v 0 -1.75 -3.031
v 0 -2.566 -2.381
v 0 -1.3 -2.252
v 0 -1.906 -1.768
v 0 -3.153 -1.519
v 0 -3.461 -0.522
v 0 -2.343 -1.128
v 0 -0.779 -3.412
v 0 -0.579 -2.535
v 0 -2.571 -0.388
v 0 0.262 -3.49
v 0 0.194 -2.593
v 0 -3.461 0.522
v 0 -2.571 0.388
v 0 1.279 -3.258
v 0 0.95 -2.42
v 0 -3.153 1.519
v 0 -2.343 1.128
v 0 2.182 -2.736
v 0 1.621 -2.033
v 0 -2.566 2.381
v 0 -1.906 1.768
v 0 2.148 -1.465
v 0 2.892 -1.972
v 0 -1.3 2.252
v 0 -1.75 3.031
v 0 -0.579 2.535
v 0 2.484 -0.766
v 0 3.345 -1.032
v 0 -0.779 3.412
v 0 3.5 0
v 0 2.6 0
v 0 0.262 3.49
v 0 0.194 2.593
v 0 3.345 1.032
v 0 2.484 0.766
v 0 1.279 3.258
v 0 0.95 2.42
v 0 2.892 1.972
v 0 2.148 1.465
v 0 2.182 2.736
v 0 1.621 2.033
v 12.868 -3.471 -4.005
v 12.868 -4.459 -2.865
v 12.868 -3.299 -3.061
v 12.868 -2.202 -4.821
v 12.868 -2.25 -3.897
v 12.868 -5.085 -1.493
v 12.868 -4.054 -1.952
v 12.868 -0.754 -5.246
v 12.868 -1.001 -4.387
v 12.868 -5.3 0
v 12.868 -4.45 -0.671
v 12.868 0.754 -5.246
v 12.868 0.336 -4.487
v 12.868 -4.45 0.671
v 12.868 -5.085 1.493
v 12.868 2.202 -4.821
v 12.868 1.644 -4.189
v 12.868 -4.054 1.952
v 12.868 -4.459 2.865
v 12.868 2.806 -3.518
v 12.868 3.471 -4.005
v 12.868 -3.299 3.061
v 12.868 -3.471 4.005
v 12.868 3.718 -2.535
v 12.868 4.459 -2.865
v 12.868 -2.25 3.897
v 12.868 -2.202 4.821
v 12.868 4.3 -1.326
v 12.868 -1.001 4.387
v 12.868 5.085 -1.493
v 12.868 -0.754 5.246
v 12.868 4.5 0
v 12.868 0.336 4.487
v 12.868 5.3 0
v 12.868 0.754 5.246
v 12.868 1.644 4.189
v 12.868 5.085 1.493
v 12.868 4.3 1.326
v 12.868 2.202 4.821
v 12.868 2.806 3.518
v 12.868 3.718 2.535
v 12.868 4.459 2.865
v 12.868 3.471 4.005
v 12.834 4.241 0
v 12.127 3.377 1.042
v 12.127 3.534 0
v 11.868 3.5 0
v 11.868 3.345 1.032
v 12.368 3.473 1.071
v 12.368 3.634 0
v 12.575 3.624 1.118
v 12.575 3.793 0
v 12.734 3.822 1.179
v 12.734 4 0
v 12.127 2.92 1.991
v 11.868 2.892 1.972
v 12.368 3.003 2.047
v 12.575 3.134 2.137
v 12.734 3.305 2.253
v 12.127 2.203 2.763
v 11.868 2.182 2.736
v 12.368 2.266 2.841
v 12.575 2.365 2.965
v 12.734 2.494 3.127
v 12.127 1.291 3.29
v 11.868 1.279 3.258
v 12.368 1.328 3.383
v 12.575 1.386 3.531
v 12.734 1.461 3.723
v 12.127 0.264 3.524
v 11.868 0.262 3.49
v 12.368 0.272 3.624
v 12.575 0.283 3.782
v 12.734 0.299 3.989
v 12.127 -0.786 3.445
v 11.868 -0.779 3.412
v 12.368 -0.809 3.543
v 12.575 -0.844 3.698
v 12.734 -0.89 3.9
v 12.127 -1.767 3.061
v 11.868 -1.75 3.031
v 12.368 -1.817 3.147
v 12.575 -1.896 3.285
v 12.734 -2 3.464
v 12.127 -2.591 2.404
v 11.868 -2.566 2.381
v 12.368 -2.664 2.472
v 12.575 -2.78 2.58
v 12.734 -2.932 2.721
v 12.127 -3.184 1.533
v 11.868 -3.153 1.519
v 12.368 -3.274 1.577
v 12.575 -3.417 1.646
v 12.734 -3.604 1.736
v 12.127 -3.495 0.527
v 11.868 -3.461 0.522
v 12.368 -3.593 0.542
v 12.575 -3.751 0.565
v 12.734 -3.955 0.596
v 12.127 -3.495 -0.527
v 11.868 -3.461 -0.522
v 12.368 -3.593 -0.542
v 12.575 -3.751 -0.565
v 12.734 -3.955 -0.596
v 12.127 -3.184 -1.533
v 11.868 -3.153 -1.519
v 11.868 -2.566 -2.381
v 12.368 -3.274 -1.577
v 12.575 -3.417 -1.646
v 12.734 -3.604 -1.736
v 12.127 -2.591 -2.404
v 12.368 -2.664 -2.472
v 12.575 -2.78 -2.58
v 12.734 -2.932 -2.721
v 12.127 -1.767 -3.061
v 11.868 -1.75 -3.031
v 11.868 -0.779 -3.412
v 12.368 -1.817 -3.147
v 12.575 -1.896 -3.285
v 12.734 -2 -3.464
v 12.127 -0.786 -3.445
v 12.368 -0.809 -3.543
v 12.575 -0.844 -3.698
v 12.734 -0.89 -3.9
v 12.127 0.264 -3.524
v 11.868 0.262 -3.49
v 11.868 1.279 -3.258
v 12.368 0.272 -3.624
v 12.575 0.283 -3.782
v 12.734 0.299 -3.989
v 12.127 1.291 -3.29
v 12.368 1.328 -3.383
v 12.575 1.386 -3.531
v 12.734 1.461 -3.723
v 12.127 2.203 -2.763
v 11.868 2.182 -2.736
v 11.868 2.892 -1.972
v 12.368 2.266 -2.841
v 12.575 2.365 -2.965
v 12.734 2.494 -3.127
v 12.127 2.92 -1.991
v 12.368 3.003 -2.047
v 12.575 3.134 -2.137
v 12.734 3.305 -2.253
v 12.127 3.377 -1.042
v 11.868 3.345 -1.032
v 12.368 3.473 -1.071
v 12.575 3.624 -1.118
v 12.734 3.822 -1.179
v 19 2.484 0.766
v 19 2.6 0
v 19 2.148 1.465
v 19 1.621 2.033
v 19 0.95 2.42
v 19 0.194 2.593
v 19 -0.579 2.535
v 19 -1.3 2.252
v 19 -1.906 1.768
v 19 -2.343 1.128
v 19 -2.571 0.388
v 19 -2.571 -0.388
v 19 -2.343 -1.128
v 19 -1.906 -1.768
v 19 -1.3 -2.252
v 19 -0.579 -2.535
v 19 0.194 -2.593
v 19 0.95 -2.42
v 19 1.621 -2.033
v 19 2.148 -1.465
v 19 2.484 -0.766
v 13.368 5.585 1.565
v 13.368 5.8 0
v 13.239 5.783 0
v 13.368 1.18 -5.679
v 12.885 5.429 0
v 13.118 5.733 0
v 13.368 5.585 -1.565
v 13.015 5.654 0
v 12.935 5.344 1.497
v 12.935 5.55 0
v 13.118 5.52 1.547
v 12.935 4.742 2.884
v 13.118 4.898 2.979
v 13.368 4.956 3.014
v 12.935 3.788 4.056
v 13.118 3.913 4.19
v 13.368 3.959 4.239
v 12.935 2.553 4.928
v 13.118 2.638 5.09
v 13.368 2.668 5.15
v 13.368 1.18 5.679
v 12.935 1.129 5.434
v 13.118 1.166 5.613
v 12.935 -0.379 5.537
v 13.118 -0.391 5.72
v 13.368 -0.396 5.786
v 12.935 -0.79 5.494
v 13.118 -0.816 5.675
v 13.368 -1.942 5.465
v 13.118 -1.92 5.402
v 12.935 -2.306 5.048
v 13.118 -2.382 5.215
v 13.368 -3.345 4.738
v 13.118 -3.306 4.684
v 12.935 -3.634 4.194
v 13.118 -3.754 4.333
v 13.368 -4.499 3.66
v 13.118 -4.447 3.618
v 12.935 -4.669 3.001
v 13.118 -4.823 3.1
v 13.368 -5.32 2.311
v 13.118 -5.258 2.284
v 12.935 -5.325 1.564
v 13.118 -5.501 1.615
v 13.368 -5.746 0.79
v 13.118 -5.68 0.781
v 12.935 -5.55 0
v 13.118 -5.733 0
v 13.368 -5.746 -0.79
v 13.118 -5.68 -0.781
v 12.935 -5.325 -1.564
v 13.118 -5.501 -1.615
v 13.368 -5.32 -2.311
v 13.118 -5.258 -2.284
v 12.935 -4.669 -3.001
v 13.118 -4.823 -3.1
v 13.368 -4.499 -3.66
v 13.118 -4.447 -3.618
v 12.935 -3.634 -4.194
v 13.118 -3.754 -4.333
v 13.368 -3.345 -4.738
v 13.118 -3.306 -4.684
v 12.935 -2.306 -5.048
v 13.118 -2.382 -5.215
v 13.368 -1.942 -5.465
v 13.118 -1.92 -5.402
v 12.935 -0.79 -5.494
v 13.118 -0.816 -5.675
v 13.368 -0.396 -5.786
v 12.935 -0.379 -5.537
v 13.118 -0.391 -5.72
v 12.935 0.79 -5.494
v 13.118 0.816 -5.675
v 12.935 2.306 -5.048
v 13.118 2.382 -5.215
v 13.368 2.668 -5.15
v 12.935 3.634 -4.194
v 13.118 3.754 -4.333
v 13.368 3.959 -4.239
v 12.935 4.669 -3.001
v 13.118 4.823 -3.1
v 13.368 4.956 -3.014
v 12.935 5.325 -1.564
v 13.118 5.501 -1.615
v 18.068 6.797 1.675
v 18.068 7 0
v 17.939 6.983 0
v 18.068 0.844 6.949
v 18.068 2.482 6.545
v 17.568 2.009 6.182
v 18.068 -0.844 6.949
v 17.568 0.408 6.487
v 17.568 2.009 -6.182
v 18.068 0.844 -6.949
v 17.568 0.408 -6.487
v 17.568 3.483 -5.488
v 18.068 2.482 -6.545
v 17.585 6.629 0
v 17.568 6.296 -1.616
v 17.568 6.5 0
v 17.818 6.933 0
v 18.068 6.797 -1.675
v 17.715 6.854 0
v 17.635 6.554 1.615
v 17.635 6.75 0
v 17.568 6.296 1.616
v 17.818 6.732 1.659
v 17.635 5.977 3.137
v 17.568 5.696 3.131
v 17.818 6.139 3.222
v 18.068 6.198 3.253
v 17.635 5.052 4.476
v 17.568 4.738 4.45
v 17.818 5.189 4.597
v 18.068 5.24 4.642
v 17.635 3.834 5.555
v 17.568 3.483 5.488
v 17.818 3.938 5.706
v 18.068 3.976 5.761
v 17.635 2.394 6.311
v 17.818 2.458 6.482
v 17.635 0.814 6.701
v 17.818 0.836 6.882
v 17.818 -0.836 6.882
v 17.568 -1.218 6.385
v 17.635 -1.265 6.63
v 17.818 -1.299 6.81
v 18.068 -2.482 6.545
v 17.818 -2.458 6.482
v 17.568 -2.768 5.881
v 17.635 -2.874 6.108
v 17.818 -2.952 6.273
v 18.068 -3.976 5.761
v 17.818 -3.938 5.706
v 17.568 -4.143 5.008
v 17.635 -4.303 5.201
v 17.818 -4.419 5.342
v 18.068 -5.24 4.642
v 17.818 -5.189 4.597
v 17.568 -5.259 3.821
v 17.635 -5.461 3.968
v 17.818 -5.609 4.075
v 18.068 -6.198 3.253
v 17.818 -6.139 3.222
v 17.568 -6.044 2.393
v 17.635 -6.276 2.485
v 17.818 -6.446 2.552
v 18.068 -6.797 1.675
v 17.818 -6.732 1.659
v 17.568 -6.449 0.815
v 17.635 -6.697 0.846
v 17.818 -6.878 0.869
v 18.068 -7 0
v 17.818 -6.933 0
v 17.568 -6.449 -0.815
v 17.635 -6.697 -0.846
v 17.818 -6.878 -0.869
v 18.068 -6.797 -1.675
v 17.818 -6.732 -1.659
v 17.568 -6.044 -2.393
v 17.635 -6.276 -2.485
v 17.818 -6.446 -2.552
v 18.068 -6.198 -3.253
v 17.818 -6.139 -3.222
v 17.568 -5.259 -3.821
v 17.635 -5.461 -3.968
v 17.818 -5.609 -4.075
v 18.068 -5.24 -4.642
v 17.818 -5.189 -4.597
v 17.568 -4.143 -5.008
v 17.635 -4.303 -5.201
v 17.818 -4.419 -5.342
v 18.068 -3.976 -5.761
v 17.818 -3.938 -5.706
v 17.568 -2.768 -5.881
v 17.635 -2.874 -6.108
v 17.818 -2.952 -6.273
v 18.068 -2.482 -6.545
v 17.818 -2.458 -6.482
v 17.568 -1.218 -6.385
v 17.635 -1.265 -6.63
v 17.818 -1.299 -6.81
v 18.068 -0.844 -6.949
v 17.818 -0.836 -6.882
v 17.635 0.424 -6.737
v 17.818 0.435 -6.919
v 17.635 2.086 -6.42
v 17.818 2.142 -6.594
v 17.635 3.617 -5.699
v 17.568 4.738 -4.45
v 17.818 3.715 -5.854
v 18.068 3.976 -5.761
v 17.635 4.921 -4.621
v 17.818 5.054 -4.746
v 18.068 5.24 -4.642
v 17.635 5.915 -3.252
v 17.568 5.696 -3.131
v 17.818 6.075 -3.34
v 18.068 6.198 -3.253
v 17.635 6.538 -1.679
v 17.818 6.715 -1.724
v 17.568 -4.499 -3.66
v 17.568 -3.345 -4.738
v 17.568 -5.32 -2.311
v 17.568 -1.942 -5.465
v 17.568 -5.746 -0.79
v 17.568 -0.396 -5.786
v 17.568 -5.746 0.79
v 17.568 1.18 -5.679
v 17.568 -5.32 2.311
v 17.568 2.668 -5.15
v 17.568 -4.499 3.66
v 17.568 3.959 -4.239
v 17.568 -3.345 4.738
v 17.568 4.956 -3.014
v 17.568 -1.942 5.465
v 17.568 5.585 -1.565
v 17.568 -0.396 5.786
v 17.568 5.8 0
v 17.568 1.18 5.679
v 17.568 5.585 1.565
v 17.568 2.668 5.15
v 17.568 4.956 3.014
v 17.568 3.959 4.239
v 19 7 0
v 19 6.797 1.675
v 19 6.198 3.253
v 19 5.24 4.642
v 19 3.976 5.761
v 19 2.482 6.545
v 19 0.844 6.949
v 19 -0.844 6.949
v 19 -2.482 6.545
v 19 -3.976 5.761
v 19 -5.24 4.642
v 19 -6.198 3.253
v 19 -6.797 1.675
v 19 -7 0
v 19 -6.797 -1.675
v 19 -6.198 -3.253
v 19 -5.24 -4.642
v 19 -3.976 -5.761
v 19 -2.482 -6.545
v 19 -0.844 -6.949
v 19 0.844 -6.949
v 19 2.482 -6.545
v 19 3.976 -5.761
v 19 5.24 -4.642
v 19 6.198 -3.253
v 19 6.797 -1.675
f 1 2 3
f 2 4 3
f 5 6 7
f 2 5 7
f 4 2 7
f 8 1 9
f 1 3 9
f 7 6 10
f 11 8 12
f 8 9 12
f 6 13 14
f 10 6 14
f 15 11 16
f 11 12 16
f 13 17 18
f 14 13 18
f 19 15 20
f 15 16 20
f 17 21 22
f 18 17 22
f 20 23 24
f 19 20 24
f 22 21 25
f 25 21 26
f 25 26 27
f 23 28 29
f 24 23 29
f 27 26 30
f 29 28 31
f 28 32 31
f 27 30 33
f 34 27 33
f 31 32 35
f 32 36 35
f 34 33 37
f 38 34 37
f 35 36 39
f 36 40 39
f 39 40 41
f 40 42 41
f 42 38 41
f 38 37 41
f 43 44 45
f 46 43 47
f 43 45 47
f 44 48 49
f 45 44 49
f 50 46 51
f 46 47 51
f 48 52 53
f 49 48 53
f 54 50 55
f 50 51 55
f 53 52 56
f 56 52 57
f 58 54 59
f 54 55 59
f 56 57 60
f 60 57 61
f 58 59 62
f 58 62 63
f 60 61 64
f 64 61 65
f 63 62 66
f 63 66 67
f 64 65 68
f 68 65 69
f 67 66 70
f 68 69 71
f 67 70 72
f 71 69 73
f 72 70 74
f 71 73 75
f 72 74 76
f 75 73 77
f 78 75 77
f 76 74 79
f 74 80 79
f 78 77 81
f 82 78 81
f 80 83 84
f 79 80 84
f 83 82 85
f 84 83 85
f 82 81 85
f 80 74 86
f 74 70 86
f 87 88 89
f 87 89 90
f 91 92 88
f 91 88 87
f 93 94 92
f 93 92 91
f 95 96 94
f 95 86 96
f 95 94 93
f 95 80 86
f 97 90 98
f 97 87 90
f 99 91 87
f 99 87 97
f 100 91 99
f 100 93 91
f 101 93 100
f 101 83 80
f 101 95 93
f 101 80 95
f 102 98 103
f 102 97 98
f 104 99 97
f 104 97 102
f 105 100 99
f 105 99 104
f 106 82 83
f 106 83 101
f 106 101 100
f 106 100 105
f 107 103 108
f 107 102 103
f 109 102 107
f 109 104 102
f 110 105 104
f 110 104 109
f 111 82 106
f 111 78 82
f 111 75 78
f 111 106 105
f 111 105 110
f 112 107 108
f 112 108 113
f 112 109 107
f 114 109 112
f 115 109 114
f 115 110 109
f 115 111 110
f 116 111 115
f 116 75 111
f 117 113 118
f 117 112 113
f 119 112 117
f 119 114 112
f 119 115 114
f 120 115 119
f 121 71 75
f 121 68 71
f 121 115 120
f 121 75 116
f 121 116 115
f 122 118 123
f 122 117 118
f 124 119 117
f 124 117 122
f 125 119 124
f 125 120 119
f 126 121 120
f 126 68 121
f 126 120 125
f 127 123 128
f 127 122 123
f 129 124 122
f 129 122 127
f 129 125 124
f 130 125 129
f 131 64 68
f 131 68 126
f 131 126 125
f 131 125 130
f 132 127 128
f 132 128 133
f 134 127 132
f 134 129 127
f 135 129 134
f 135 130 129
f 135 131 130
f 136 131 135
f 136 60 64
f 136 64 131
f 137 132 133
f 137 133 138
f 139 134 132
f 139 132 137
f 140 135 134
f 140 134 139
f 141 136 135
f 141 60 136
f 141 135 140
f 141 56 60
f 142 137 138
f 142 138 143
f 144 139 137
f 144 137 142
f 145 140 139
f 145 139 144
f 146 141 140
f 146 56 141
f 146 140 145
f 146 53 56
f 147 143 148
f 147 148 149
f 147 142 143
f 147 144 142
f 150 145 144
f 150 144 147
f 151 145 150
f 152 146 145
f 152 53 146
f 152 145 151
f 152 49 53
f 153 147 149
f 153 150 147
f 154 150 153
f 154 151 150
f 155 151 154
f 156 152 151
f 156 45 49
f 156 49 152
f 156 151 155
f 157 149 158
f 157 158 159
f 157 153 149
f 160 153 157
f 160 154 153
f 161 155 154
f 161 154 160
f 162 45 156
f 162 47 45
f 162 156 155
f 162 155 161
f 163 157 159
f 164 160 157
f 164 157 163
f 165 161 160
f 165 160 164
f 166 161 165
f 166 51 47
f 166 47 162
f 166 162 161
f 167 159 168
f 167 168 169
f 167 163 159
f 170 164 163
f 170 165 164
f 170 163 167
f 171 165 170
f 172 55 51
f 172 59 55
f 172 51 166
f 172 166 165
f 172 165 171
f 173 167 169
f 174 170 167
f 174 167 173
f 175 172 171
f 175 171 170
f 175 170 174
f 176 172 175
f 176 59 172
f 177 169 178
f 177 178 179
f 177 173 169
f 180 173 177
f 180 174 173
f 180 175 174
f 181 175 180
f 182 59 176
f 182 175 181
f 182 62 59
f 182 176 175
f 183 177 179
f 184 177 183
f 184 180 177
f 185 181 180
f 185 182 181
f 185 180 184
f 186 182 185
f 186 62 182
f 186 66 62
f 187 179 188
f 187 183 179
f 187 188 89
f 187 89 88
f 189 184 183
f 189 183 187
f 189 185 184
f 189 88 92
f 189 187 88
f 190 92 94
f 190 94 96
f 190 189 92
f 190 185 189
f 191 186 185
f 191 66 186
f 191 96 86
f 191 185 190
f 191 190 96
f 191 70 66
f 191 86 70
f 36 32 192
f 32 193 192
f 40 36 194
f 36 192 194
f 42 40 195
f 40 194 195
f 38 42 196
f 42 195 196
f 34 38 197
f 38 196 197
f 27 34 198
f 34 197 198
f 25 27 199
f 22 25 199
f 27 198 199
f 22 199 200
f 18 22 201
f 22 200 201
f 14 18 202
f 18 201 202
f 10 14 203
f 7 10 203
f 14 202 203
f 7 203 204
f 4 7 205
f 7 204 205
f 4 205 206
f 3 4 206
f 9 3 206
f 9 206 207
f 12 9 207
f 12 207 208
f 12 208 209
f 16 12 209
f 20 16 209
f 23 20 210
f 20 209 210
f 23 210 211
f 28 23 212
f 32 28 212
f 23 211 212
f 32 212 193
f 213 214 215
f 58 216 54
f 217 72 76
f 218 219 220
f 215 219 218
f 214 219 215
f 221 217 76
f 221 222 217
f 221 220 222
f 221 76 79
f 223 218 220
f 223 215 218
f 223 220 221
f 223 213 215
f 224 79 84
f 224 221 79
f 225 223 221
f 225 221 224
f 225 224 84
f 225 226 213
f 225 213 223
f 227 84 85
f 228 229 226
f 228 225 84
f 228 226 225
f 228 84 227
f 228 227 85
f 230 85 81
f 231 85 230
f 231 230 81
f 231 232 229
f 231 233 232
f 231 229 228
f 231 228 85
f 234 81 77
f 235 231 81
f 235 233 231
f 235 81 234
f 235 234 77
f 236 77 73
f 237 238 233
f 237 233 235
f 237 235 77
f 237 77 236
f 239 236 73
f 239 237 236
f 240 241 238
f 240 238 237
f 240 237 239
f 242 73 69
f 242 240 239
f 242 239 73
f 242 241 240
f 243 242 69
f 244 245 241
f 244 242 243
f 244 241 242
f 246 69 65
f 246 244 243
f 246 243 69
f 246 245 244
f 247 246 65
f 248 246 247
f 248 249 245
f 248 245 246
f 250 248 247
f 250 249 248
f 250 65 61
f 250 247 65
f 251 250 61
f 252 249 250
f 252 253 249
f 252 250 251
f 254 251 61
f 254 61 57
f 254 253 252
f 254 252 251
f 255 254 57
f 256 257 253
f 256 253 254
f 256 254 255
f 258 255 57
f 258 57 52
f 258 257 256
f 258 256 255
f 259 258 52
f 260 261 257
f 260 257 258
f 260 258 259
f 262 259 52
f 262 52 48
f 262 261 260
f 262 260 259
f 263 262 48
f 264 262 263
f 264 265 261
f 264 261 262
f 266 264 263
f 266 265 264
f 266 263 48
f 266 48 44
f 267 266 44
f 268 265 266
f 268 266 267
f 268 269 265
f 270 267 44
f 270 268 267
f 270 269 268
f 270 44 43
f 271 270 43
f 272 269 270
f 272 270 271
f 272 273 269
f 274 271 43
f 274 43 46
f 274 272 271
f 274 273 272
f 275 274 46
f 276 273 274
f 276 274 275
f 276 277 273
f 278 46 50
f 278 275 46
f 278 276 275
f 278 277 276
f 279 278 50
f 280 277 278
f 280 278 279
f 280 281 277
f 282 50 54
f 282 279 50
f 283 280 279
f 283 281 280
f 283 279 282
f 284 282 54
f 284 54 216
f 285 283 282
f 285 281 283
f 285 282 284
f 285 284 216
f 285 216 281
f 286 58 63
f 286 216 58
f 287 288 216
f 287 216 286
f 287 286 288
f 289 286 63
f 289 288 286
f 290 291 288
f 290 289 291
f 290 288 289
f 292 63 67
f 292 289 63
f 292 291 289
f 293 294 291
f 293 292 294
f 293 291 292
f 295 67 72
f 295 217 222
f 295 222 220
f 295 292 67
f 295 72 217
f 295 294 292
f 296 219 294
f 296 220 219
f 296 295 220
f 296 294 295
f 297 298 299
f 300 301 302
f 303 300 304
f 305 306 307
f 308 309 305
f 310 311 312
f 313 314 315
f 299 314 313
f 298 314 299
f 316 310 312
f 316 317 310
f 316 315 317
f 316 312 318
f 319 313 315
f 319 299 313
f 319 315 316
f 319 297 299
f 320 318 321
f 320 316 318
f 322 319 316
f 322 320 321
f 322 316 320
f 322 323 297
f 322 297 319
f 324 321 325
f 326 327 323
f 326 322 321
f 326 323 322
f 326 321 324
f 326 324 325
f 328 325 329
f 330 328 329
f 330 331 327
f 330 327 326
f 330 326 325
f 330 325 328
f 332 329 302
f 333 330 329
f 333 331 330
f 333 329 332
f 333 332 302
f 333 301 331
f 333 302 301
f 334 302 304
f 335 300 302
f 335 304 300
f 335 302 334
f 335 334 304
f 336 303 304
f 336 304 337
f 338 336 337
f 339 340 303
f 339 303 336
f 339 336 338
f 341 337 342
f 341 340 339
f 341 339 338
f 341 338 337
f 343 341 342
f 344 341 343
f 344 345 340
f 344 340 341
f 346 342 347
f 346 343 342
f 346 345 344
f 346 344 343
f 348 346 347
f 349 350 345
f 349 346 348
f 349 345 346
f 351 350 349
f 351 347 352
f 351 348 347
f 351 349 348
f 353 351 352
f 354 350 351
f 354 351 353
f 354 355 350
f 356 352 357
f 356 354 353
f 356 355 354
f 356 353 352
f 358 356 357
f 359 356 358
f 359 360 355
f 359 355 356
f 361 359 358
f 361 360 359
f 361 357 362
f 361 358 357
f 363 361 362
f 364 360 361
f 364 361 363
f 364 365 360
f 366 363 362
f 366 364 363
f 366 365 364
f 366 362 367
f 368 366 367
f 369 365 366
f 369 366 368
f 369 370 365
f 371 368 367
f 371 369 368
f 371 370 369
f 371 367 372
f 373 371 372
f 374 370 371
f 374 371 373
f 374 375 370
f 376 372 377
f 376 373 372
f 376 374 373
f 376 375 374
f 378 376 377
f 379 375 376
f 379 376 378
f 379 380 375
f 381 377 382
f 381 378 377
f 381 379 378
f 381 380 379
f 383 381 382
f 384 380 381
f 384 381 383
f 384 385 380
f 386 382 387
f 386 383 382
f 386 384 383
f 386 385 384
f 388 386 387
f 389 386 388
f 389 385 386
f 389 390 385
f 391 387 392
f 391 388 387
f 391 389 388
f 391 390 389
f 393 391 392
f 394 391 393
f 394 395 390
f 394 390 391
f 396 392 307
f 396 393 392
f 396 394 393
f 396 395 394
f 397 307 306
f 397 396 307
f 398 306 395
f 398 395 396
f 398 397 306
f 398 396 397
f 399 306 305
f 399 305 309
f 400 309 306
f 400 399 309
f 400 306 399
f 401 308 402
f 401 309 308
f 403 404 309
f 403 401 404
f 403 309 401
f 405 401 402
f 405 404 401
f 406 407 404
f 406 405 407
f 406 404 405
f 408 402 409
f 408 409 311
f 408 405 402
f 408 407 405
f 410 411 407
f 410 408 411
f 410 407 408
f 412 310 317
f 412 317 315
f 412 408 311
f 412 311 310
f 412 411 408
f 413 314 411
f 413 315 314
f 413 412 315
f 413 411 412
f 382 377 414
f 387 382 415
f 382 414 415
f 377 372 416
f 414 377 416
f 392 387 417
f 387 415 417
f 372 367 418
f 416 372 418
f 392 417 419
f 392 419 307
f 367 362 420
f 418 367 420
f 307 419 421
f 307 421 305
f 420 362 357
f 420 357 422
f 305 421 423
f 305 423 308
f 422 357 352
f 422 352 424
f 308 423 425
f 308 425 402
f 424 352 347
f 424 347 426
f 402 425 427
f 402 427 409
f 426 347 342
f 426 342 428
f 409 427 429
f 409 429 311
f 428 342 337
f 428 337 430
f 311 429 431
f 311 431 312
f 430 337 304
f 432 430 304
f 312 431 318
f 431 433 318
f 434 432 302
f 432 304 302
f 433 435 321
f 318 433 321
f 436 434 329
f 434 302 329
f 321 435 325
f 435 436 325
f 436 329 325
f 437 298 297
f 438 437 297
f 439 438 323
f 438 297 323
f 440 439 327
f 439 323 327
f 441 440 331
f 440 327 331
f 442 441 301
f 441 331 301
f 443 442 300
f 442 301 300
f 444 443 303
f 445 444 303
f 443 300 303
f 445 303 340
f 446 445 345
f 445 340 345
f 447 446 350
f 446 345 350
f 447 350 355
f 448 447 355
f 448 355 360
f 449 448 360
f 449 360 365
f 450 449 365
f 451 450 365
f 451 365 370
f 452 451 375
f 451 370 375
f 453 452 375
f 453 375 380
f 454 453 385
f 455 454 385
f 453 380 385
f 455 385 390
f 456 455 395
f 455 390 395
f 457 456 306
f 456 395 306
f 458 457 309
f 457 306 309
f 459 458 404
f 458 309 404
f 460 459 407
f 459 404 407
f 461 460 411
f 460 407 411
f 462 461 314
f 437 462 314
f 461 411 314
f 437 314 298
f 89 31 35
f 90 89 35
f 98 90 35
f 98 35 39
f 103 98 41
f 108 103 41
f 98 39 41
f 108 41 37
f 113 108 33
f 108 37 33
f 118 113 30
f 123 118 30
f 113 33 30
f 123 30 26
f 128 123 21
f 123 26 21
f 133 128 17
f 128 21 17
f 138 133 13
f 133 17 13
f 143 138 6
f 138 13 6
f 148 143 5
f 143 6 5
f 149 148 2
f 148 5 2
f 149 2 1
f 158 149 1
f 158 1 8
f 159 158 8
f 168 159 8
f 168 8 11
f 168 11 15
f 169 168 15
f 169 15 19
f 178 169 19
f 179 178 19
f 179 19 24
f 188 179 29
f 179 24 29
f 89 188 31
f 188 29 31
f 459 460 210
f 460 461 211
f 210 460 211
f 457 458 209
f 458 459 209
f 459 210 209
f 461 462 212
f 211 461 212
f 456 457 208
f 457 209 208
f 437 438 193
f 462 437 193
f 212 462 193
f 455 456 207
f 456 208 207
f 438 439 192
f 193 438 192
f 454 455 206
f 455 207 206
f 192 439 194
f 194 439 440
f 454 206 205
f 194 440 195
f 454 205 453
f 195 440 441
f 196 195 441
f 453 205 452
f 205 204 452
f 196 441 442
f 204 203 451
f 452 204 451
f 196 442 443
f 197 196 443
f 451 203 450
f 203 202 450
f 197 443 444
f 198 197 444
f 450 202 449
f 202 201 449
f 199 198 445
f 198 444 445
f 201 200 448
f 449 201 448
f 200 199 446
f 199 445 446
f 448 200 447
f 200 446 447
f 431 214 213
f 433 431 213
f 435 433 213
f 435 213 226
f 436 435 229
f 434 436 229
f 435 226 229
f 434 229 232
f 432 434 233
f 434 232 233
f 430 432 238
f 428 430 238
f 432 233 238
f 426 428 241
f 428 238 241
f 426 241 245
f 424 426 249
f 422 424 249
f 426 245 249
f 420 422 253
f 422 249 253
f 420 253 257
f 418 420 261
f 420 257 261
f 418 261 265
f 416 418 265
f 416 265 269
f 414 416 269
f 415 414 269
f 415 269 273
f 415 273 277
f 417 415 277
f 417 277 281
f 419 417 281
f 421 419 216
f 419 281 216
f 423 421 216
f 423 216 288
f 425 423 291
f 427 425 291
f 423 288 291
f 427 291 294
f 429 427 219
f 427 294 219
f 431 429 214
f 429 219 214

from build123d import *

# Parameters (mm, degrees)
F2_R = 1
F3_R = 0.5


with BuildPart() as f1:
    # F0 (on Top) → F1 (revolve)
    with BuildSketch(Plane.XY):
        Polygon((12.8682, 3.5), (0, 3.5), (0, 2.6), (1.560832, 2.6), (17.439168, 2.6), (19, 2.6), (19, 7), (17.5682, 7), (17.5682, 5.8), (12.8682, 5.8), align=None)
    revolve(axis=Axis((8.987734, 0, 0), (1, 0, 0)))

    # F2
    f2_edges = [f1.edges().sort_by_distance(p)[0] for p in [
        (12.8682, -3.5, 0),
    ]]
    fillet(f2_edges, radius=F2_R)

    # F3
    f3_edges = [f1.edges().sort_by_distance(p)[0] for p in [
        (17.5682, -7, 0),
        (12.8682, -5.8, 0),
    ]]
    fillet(f3_edges, radius=F3_R)


solid = f1.part
